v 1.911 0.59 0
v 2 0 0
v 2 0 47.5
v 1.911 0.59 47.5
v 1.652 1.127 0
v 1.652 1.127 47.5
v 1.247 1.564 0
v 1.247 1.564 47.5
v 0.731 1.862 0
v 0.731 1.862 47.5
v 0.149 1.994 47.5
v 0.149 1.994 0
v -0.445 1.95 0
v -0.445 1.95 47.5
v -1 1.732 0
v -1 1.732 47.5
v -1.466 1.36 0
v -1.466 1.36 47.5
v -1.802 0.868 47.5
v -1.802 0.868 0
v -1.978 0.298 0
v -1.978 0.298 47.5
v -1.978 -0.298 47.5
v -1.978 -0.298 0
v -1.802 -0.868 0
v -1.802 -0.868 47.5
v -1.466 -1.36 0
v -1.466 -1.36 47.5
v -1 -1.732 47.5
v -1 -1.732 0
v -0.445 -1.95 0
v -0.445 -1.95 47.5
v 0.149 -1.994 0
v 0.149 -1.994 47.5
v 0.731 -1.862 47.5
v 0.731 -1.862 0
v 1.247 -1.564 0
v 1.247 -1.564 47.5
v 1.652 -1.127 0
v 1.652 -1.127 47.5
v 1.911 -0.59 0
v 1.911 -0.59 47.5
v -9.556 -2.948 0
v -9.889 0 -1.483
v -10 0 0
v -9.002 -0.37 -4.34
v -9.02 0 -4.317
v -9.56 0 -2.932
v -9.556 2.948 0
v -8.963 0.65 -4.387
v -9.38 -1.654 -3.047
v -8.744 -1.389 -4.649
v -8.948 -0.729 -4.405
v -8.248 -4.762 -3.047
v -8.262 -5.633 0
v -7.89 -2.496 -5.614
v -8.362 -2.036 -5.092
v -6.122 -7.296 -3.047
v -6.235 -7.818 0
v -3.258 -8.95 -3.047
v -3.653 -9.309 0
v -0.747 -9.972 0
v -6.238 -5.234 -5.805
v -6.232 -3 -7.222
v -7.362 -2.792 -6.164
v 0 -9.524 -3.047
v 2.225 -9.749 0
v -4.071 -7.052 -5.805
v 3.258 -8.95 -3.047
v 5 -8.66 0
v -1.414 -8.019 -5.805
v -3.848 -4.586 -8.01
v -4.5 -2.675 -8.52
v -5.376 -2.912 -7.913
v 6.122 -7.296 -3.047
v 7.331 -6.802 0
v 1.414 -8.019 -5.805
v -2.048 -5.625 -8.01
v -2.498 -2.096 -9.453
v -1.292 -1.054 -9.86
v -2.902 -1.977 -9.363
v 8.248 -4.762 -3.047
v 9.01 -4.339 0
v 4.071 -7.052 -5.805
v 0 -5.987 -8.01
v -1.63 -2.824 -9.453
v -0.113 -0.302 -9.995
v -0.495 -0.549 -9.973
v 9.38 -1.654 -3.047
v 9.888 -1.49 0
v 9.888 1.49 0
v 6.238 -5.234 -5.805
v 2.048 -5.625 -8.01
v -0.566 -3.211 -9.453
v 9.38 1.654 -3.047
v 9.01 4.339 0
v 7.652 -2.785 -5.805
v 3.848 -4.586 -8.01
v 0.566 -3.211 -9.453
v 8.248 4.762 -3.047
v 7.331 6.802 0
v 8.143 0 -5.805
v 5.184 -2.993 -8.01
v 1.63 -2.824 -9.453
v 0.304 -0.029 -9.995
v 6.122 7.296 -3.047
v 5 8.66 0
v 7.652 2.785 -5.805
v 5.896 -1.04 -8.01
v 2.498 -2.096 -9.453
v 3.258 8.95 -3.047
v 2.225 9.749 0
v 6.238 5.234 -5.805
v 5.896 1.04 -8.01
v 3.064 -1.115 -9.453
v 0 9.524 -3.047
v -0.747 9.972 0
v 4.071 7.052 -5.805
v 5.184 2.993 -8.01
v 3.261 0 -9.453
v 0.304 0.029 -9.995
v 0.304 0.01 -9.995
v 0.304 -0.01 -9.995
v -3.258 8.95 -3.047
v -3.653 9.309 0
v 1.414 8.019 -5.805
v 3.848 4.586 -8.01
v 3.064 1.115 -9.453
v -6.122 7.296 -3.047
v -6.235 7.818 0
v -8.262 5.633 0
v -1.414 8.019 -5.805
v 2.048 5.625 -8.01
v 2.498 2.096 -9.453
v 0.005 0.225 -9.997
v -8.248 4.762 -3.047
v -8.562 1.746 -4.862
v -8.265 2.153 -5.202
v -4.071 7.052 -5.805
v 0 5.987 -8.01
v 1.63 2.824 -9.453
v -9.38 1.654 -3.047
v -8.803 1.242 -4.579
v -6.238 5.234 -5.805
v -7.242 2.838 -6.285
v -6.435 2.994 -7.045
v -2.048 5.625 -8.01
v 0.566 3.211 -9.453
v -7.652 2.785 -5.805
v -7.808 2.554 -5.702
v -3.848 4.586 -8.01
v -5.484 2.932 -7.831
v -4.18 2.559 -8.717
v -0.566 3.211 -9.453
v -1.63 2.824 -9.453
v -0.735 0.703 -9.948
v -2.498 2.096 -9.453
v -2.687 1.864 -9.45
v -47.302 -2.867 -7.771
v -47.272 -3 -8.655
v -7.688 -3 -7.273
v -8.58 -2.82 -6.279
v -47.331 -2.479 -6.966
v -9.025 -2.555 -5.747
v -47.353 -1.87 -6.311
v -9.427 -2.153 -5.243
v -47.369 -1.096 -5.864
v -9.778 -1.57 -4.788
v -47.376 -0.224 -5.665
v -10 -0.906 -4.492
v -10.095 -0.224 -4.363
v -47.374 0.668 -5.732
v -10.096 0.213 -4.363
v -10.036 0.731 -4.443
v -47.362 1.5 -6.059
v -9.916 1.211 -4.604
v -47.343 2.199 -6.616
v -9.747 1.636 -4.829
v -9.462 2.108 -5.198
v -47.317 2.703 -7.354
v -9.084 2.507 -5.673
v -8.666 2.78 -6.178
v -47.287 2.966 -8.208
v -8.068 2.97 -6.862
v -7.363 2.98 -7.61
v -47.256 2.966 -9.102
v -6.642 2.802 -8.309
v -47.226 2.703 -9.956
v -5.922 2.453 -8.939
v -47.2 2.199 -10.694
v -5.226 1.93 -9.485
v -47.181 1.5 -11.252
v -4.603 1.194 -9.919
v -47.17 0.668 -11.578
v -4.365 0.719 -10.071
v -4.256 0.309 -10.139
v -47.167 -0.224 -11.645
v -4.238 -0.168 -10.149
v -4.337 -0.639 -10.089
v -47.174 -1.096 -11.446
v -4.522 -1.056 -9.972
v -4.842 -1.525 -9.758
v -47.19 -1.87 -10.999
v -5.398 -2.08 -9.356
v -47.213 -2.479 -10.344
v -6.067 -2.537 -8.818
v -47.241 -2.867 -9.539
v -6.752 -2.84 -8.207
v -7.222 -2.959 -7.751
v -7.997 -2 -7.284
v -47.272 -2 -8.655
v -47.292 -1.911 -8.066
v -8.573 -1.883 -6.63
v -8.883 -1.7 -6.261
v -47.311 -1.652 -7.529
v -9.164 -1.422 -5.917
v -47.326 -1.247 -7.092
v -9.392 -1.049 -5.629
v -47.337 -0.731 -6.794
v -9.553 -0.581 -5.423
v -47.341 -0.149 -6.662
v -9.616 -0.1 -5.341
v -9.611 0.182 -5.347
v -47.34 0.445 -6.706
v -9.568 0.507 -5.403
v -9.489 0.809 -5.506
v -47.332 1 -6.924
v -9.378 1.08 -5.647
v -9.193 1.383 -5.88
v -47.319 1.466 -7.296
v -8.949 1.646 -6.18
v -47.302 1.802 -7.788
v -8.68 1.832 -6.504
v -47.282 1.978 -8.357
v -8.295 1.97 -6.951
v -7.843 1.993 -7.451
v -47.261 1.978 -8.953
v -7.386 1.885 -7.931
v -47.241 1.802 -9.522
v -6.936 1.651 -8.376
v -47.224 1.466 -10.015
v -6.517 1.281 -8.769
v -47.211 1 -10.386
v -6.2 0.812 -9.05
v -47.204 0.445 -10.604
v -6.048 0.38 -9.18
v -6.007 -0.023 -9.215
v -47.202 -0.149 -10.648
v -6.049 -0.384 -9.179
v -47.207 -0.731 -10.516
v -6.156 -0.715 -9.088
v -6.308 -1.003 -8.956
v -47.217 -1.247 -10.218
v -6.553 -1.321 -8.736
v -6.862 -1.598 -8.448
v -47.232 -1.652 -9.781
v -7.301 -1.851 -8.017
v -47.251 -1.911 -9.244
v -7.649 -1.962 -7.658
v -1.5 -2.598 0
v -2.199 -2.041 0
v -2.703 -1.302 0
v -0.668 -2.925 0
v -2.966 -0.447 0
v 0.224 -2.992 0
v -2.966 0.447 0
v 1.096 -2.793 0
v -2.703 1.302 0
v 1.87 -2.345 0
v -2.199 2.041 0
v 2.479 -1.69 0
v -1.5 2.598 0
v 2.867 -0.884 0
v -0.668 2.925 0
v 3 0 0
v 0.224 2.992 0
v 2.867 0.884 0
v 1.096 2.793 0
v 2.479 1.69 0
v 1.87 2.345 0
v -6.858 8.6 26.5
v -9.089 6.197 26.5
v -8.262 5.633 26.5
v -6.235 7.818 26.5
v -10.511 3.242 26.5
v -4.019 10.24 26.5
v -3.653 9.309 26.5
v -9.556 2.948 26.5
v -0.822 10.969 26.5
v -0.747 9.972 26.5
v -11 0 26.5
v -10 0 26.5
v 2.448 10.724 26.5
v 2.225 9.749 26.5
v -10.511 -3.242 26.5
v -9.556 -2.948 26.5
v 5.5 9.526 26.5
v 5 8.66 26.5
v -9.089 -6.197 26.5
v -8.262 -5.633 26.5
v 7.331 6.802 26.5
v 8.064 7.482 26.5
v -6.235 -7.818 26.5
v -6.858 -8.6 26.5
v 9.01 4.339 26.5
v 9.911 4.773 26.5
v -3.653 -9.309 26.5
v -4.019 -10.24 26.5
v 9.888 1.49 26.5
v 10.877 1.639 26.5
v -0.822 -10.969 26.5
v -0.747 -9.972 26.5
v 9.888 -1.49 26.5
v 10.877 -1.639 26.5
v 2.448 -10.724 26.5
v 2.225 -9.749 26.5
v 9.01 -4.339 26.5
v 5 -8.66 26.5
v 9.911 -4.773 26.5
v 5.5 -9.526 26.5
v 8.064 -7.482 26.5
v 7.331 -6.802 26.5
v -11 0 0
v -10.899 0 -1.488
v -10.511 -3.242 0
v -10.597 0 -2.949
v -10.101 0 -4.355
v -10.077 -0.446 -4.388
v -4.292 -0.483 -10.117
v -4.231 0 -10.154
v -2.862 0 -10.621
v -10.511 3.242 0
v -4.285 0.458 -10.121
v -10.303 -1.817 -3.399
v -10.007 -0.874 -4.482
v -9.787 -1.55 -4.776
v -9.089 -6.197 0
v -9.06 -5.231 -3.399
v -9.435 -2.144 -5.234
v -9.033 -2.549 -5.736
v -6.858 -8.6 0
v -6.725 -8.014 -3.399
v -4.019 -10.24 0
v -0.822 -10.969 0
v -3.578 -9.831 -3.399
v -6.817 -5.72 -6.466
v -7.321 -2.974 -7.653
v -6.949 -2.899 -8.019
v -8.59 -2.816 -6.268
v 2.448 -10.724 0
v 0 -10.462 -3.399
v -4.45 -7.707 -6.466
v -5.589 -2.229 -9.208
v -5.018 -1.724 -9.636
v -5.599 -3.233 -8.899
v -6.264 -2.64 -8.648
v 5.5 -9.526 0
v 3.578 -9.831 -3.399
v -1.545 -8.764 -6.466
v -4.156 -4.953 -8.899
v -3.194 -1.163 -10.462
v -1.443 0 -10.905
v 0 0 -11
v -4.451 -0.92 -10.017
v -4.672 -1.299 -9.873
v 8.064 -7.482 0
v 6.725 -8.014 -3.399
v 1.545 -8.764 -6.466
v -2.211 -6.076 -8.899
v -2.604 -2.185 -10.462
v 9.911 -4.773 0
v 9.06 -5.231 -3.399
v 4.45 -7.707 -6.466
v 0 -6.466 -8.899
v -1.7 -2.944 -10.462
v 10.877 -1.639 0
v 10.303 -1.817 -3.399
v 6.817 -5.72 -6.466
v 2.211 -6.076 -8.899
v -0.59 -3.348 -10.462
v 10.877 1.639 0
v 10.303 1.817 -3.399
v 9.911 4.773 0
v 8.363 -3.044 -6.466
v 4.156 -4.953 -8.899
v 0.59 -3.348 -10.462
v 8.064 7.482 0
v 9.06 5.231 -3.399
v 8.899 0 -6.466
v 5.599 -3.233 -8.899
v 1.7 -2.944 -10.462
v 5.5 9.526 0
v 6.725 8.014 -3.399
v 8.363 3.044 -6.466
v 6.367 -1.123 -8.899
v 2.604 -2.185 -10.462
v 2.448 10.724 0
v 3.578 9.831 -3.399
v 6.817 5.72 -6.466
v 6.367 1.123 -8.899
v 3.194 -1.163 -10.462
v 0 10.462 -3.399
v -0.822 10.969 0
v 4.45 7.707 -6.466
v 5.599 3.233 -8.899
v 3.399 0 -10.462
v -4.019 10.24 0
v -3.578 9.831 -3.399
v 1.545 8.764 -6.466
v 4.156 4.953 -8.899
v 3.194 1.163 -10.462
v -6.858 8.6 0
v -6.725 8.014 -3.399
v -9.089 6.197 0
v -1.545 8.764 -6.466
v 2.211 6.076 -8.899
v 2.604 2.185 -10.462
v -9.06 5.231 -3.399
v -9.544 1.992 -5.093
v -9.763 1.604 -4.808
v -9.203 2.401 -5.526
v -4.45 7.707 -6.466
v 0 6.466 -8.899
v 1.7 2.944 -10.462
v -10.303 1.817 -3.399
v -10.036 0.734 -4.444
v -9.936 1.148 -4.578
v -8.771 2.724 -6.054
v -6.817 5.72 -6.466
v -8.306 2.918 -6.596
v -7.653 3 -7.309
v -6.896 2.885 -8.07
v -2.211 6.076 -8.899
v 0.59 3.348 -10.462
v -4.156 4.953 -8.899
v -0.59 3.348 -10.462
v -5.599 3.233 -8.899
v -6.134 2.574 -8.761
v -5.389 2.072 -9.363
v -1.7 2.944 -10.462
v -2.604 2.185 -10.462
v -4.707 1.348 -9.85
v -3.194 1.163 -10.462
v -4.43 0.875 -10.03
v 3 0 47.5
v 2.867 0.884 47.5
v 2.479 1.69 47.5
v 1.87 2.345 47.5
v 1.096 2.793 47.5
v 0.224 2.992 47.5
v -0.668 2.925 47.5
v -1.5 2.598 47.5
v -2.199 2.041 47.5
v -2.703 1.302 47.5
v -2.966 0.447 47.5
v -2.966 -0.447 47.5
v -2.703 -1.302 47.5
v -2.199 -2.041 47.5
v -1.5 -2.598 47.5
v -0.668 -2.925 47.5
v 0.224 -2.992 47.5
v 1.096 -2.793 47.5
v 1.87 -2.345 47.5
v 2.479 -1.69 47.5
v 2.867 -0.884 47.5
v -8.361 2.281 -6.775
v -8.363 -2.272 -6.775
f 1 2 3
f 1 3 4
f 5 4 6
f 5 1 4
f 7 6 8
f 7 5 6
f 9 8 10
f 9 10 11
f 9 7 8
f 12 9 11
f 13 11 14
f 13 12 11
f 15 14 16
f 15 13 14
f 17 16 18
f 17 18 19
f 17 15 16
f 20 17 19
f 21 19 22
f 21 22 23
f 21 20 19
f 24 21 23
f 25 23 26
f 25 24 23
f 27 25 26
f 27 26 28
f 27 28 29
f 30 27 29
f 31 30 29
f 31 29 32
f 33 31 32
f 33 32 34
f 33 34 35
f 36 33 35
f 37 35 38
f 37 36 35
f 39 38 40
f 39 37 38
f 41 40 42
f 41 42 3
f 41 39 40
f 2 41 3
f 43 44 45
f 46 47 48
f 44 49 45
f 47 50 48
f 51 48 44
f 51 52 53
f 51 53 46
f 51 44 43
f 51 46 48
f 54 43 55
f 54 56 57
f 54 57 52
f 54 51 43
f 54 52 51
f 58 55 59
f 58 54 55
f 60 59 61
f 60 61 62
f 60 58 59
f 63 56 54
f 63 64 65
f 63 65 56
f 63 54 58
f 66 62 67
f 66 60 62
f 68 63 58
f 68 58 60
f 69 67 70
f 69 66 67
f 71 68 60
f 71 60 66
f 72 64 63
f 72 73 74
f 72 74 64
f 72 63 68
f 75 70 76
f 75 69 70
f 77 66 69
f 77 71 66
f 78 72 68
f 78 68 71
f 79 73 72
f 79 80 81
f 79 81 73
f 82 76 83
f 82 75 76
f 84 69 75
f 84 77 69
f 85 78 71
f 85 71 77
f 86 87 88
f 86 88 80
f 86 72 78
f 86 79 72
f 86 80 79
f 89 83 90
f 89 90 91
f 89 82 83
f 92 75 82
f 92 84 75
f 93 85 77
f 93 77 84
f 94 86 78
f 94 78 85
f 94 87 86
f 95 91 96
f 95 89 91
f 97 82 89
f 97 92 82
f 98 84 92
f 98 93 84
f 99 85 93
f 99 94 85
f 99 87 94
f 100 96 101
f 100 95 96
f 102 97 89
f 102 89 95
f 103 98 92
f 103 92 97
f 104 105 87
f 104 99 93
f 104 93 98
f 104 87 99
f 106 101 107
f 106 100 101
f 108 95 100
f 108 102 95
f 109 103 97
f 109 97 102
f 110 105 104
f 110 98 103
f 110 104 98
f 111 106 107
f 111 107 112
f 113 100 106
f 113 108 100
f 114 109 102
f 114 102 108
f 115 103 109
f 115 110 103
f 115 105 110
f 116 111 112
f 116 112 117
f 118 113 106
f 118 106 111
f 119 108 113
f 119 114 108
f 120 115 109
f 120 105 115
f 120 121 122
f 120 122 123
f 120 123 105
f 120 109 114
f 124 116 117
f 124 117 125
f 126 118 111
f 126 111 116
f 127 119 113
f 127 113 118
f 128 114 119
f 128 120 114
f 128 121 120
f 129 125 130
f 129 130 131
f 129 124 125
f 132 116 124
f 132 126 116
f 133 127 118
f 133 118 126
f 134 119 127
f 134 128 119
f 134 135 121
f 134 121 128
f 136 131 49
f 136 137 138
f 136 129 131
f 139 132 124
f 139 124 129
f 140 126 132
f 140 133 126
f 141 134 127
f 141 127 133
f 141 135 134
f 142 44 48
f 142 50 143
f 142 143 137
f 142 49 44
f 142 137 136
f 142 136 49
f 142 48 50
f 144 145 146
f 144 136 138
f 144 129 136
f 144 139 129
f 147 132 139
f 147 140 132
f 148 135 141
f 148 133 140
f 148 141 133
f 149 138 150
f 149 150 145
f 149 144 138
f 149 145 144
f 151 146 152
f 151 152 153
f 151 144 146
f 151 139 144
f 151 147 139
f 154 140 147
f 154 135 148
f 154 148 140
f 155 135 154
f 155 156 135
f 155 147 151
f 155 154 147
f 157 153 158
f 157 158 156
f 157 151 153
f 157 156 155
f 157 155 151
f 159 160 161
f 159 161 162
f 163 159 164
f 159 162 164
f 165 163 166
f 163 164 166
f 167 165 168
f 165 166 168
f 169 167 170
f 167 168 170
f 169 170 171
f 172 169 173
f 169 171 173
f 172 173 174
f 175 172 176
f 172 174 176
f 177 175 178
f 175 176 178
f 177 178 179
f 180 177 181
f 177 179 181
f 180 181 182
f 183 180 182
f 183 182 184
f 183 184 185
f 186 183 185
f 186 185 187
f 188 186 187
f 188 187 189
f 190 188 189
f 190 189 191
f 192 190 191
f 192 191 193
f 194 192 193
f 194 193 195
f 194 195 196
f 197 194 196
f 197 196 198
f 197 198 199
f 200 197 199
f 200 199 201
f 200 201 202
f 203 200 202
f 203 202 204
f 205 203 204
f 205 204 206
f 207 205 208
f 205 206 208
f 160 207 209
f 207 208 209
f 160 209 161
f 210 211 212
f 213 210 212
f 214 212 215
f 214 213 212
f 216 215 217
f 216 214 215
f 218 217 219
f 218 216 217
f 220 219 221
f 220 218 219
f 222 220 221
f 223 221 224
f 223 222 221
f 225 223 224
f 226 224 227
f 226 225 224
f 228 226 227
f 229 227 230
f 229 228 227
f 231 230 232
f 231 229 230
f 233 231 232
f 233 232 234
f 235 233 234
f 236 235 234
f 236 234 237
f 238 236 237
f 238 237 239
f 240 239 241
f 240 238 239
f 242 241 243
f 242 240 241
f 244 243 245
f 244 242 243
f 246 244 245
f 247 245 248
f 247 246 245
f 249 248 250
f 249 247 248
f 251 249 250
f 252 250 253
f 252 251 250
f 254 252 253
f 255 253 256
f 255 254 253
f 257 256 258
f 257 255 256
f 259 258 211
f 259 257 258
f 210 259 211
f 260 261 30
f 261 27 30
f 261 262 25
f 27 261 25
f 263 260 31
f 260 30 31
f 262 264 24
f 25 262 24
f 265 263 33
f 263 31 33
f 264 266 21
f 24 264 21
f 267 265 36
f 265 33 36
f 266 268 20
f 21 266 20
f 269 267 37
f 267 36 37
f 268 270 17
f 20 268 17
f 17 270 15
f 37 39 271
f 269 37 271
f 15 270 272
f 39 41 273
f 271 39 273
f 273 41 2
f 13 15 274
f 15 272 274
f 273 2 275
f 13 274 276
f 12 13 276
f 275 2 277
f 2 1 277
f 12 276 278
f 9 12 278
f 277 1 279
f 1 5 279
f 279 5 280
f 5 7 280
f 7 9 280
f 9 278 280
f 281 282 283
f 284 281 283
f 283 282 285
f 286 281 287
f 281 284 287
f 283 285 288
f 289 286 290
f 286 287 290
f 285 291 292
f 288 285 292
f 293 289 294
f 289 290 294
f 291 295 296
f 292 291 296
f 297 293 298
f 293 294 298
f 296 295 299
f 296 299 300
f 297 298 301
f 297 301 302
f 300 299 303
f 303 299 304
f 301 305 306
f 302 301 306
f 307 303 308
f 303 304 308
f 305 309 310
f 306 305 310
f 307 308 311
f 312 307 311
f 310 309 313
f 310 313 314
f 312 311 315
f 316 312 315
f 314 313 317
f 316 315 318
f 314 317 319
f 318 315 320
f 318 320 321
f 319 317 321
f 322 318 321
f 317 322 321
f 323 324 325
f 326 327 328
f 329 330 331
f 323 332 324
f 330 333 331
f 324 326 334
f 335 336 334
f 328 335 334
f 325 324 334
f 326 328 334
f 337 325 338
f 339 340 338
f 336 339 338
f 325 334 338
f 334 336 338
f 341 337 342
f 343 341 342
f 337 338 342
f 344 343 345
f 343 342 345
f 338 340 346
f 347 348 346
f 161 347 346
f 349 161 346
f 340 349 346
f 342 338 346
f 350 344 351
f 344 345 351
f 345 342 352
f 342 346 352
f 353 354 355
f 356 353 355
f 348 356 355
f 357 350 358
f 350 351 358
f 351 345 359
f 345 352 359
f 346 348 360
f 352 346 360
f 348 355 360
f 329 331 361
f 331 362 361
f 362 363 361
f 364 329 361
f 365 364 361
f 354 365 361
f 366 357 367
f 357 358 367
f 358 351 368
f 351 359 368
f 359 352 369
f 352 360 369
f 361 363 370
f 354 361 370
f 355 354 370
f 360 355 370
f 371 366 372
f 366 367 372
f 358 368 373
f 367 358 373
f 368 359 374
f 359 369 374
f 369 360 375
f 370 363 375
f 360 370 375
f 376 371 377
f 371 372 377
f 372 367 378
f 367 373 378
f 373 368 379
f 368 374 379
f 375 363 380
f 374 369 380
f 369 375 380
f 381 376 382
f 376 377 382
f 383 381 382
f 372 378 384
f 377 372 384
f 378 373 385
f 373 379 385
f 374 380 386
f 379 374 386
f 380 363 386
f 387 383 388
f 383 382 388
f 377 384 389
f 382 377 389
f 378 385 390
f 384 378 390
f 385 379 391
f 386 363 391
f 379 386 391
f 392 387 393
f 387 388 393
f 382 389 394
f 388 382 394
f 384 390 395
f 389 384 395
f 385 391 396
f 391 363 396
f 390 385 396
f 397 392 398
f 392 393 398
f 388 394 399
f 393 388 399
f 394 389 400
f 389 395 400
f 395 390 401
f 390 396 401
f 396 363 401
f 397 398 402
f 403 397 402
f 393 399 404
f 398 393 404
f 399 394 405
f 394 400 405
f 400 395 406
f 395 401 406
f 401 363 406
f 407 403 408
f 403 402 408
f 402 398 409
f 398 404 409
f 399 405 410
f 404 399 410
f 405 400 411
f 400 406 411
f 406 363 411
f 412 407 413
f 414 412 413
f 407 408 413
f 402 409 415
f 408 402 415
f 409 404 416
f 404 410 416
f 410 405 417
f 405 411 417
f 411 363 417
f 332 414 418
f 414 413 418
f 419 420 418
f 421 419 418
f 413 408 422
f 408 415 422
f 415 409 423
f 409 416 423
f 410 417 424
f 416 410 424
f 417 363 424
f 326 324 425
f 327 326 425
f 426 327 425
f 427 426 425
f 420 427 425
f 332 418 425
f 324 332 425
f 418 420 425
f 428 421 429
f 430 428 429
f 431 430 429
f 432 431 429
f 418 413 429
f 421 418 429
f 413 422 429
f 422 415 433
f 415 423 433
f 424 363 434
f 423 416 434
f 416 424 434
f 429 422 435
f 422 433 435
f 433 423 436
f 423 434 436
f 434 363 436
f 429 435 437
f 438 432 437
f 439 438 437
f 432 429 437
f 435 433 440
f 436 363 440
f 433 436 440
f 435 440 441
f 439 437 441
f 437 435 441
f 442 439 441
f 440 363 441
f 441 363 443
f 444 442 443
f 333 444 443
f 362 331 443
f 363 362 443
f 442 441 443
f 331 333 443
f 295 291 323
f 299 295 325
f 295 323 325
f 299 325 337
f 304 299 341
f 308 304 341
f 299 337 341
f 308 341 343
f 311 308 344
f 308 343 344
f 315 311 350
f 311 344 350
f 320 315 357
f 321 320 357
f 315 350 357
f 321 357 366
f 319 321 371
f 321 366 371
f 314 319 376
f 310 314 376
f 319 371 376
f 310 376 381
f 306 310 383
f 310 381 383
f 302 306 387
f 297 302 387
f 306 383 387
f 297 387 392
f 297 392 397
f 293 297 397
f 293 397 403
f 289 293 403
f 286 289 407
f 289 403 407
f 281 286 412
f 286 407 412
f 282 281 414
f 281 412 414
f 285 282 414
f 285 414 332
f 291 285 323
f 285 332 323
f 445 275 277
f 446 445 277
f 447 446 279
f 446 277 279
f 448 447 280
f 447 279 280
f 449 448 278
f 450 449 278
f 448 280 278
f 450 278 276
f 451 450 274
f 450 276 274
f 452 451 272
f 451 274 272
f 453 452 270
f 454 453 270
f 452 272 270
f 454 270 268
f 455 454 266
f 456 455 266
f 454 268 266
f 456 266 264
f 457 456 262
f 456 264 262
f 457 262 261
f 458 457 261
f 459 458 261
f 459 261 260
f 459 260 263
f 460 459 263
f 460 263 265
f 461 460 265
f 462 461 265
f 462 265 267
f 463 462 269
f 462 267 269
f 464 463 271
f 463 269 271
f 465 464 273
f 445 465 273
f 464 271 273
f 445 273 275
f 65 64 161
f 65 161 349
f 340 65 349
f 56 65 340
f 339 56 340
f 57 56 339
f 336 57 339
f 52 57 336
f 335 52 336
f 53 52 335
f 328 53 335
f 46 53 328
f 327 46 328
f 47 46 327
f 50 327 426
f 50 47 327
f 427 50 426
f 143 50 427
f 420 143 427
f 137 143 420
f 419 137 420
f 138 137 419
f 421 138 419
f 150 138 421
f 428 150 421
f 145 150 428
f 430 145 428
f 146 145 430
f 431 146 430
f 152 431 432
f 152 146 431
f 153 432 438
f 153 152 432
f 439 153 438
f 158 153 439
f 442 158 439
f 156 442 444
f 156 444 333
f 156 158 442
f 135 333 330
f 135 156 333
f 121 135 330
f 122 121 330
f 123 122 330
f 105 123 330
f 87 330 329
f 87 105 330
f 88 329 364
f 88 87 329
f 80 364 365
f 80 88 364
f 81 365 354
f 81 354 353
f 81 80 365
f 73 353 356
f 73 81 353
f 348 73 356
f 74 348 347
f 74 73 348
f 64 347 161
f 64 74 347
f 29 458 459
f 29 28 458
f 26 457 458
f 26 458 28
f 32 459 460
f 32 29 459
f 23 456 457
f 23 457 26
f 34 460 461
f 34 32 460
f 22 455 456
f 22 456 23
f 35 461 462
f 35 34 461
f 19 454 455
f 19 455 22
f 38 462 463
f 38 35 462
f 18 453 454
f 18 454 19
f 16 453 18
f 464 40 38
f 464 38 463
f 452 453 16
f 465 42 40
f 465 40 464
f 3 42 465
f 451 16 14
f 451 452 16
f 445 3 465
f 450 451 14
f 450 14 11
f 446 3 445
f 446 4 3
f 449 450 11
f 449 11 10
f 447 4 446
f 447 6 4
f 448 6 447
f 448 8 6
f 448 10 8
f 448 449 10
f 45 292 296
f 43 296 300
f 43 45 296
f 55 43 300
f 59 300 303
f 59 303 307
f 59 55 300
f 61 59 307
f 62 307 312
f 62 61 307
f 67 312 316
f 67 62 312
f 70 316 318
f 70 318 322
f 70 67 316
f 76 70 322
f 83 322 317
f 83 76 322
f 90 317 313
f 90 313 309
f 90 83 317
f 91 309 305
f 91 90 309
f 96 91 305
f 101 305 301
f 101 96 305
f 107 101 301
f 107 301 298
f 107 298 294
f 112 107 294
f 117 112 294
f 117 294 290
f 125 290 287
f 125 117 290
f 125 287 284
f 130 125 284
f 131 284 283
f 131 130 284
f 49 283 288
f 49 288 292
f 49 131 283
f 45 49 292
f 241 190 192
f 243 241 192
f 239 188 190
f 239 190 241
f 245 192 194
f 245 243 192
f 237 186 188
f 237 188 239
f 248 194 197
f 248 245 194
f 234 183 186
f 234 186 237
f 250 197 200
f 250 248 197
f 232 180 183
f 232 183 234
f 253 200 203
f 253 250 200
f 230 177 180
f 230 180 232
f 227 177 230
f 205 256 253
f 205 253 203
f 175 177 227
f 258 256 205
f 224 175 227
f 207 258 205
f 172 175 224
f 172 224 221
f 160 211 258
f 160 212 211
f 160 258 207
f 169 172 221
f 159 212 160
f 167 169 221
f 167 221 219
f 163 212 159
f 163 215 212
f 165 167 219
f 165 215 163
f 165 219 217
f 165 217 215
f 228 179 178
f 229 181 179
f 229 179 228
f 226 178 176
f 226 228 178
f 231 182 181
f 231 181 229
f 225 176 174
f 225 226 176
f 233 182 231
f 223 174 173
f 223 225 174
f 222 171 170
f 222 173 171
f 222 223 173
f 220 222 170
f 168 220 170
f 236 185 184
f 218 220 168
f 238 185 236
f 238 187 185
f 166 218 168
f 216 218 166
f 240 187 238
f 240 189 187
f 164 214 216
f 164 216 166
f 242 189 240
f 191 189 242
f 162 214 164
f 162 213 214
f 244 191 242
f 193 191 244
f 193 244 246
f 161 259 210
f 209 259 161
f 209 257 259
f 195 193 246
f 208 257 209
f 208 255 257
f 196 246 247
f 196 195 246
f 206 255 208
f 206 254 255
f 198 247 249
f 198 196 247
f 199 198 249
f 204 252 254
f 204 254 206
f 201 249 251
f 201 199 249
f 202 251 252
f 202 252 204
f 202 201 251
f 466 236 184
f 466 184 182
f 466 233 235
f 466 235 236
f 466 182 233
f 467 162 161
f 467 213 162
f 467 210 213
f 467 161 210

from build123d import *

# Parameters (mm, degrees)
F2_T     = -1
F3_R     = 3
F3_R_2   = 2
F4_DEPTH = 47.5
F8_R     = 3
F9_DEPTH = 47.5
F13_T    = -1


with BuildPart() as f1:
    # F0 (on Front) → F1 (revolve)
    with BuildSketch(Plane.XZ):
        with BuildLine():
            Line((0, 0), (0, 26.5))
            Line((0, 26.5), (-11, 26.5))
            Line((-11, 26.5), (-11, 0))
            ThreePointArc((-11, 0), (-7.7781745931, -7.7781745931), (0, -11))
            Line((0, -11), (0, 0))
        make_face()
    revolve(axis=Axis((0, 0, 13.25), (0, 0, 1)))

    # F2
    f2_openings = [f1.faces().sort_by_distance(p)[0] for p in [
        (0, 0, 26.5),
    ]]
    offset(amount=F2_T, openings=f2_openings)


with BuildPart() as f4:
    # F3 (on Top) → F4 (new body)
    with BuildSketch(Plane.XY):
        Circle(F3_R)
        Circle(F3_R_2, mode=Mode.SUBTRACT)
    extrude(amount=F4_DEPTH)


with BuildPart() as f9:
    # F8 (on offset) → F9 (new body)
    with BuildSketch(Plane(origin=(-0.0448633716, 0, -0.0015666635), x_dir=(0, -1, 0), z_dir=(-0.999390827, 0, -0.0348994967))):
        with Locations((0, -7)):
            Circle(F8_R)
    extrude(amount=F9_DEPTH)


with BuildPart() as f1_1:
    add(f1.part)

    # F10: cut F9
    add(f9.part, mode=Mode.SUBTRACT)


with BuildPart() as f11:
    # F0 (on Front) → F11 (revolve)
    with BuildSketch(Plane.XZ):
        with BuildLine():
            Line((0, 0), (0, 26.5))
            Line((0, 26.5), (-11, 26.5))
            Line((-11, 26.5), (-11, 0))
            ThreePointArc((-11, 0), (-7.7781745931, -7.7781745931), (0, -11))
            Line((0, -11), (0, 0))
        make_face()
    revolve(axis=Axis((0, 0, 13.25), (0, 0, 1)))


with BuildPart() as f9_1:
    add(f9.part)

    # F12: cut F11
    add(f11.part, mode=Mode.SUBTRACT)

    # F13
    f13_openings = [f9_1.faces().sort_by_distance(p)[0] for p in [
        (-47.271631, 0, -8.655029),
        (-7.729963, -3e-06, -7.826089),
    ]]
    offset(amount=F13_T, openings=f13_openings, kind=Kind.INTERSECTION)


solid = Compound([f4.part, f1_1.part, f9_1.part])
